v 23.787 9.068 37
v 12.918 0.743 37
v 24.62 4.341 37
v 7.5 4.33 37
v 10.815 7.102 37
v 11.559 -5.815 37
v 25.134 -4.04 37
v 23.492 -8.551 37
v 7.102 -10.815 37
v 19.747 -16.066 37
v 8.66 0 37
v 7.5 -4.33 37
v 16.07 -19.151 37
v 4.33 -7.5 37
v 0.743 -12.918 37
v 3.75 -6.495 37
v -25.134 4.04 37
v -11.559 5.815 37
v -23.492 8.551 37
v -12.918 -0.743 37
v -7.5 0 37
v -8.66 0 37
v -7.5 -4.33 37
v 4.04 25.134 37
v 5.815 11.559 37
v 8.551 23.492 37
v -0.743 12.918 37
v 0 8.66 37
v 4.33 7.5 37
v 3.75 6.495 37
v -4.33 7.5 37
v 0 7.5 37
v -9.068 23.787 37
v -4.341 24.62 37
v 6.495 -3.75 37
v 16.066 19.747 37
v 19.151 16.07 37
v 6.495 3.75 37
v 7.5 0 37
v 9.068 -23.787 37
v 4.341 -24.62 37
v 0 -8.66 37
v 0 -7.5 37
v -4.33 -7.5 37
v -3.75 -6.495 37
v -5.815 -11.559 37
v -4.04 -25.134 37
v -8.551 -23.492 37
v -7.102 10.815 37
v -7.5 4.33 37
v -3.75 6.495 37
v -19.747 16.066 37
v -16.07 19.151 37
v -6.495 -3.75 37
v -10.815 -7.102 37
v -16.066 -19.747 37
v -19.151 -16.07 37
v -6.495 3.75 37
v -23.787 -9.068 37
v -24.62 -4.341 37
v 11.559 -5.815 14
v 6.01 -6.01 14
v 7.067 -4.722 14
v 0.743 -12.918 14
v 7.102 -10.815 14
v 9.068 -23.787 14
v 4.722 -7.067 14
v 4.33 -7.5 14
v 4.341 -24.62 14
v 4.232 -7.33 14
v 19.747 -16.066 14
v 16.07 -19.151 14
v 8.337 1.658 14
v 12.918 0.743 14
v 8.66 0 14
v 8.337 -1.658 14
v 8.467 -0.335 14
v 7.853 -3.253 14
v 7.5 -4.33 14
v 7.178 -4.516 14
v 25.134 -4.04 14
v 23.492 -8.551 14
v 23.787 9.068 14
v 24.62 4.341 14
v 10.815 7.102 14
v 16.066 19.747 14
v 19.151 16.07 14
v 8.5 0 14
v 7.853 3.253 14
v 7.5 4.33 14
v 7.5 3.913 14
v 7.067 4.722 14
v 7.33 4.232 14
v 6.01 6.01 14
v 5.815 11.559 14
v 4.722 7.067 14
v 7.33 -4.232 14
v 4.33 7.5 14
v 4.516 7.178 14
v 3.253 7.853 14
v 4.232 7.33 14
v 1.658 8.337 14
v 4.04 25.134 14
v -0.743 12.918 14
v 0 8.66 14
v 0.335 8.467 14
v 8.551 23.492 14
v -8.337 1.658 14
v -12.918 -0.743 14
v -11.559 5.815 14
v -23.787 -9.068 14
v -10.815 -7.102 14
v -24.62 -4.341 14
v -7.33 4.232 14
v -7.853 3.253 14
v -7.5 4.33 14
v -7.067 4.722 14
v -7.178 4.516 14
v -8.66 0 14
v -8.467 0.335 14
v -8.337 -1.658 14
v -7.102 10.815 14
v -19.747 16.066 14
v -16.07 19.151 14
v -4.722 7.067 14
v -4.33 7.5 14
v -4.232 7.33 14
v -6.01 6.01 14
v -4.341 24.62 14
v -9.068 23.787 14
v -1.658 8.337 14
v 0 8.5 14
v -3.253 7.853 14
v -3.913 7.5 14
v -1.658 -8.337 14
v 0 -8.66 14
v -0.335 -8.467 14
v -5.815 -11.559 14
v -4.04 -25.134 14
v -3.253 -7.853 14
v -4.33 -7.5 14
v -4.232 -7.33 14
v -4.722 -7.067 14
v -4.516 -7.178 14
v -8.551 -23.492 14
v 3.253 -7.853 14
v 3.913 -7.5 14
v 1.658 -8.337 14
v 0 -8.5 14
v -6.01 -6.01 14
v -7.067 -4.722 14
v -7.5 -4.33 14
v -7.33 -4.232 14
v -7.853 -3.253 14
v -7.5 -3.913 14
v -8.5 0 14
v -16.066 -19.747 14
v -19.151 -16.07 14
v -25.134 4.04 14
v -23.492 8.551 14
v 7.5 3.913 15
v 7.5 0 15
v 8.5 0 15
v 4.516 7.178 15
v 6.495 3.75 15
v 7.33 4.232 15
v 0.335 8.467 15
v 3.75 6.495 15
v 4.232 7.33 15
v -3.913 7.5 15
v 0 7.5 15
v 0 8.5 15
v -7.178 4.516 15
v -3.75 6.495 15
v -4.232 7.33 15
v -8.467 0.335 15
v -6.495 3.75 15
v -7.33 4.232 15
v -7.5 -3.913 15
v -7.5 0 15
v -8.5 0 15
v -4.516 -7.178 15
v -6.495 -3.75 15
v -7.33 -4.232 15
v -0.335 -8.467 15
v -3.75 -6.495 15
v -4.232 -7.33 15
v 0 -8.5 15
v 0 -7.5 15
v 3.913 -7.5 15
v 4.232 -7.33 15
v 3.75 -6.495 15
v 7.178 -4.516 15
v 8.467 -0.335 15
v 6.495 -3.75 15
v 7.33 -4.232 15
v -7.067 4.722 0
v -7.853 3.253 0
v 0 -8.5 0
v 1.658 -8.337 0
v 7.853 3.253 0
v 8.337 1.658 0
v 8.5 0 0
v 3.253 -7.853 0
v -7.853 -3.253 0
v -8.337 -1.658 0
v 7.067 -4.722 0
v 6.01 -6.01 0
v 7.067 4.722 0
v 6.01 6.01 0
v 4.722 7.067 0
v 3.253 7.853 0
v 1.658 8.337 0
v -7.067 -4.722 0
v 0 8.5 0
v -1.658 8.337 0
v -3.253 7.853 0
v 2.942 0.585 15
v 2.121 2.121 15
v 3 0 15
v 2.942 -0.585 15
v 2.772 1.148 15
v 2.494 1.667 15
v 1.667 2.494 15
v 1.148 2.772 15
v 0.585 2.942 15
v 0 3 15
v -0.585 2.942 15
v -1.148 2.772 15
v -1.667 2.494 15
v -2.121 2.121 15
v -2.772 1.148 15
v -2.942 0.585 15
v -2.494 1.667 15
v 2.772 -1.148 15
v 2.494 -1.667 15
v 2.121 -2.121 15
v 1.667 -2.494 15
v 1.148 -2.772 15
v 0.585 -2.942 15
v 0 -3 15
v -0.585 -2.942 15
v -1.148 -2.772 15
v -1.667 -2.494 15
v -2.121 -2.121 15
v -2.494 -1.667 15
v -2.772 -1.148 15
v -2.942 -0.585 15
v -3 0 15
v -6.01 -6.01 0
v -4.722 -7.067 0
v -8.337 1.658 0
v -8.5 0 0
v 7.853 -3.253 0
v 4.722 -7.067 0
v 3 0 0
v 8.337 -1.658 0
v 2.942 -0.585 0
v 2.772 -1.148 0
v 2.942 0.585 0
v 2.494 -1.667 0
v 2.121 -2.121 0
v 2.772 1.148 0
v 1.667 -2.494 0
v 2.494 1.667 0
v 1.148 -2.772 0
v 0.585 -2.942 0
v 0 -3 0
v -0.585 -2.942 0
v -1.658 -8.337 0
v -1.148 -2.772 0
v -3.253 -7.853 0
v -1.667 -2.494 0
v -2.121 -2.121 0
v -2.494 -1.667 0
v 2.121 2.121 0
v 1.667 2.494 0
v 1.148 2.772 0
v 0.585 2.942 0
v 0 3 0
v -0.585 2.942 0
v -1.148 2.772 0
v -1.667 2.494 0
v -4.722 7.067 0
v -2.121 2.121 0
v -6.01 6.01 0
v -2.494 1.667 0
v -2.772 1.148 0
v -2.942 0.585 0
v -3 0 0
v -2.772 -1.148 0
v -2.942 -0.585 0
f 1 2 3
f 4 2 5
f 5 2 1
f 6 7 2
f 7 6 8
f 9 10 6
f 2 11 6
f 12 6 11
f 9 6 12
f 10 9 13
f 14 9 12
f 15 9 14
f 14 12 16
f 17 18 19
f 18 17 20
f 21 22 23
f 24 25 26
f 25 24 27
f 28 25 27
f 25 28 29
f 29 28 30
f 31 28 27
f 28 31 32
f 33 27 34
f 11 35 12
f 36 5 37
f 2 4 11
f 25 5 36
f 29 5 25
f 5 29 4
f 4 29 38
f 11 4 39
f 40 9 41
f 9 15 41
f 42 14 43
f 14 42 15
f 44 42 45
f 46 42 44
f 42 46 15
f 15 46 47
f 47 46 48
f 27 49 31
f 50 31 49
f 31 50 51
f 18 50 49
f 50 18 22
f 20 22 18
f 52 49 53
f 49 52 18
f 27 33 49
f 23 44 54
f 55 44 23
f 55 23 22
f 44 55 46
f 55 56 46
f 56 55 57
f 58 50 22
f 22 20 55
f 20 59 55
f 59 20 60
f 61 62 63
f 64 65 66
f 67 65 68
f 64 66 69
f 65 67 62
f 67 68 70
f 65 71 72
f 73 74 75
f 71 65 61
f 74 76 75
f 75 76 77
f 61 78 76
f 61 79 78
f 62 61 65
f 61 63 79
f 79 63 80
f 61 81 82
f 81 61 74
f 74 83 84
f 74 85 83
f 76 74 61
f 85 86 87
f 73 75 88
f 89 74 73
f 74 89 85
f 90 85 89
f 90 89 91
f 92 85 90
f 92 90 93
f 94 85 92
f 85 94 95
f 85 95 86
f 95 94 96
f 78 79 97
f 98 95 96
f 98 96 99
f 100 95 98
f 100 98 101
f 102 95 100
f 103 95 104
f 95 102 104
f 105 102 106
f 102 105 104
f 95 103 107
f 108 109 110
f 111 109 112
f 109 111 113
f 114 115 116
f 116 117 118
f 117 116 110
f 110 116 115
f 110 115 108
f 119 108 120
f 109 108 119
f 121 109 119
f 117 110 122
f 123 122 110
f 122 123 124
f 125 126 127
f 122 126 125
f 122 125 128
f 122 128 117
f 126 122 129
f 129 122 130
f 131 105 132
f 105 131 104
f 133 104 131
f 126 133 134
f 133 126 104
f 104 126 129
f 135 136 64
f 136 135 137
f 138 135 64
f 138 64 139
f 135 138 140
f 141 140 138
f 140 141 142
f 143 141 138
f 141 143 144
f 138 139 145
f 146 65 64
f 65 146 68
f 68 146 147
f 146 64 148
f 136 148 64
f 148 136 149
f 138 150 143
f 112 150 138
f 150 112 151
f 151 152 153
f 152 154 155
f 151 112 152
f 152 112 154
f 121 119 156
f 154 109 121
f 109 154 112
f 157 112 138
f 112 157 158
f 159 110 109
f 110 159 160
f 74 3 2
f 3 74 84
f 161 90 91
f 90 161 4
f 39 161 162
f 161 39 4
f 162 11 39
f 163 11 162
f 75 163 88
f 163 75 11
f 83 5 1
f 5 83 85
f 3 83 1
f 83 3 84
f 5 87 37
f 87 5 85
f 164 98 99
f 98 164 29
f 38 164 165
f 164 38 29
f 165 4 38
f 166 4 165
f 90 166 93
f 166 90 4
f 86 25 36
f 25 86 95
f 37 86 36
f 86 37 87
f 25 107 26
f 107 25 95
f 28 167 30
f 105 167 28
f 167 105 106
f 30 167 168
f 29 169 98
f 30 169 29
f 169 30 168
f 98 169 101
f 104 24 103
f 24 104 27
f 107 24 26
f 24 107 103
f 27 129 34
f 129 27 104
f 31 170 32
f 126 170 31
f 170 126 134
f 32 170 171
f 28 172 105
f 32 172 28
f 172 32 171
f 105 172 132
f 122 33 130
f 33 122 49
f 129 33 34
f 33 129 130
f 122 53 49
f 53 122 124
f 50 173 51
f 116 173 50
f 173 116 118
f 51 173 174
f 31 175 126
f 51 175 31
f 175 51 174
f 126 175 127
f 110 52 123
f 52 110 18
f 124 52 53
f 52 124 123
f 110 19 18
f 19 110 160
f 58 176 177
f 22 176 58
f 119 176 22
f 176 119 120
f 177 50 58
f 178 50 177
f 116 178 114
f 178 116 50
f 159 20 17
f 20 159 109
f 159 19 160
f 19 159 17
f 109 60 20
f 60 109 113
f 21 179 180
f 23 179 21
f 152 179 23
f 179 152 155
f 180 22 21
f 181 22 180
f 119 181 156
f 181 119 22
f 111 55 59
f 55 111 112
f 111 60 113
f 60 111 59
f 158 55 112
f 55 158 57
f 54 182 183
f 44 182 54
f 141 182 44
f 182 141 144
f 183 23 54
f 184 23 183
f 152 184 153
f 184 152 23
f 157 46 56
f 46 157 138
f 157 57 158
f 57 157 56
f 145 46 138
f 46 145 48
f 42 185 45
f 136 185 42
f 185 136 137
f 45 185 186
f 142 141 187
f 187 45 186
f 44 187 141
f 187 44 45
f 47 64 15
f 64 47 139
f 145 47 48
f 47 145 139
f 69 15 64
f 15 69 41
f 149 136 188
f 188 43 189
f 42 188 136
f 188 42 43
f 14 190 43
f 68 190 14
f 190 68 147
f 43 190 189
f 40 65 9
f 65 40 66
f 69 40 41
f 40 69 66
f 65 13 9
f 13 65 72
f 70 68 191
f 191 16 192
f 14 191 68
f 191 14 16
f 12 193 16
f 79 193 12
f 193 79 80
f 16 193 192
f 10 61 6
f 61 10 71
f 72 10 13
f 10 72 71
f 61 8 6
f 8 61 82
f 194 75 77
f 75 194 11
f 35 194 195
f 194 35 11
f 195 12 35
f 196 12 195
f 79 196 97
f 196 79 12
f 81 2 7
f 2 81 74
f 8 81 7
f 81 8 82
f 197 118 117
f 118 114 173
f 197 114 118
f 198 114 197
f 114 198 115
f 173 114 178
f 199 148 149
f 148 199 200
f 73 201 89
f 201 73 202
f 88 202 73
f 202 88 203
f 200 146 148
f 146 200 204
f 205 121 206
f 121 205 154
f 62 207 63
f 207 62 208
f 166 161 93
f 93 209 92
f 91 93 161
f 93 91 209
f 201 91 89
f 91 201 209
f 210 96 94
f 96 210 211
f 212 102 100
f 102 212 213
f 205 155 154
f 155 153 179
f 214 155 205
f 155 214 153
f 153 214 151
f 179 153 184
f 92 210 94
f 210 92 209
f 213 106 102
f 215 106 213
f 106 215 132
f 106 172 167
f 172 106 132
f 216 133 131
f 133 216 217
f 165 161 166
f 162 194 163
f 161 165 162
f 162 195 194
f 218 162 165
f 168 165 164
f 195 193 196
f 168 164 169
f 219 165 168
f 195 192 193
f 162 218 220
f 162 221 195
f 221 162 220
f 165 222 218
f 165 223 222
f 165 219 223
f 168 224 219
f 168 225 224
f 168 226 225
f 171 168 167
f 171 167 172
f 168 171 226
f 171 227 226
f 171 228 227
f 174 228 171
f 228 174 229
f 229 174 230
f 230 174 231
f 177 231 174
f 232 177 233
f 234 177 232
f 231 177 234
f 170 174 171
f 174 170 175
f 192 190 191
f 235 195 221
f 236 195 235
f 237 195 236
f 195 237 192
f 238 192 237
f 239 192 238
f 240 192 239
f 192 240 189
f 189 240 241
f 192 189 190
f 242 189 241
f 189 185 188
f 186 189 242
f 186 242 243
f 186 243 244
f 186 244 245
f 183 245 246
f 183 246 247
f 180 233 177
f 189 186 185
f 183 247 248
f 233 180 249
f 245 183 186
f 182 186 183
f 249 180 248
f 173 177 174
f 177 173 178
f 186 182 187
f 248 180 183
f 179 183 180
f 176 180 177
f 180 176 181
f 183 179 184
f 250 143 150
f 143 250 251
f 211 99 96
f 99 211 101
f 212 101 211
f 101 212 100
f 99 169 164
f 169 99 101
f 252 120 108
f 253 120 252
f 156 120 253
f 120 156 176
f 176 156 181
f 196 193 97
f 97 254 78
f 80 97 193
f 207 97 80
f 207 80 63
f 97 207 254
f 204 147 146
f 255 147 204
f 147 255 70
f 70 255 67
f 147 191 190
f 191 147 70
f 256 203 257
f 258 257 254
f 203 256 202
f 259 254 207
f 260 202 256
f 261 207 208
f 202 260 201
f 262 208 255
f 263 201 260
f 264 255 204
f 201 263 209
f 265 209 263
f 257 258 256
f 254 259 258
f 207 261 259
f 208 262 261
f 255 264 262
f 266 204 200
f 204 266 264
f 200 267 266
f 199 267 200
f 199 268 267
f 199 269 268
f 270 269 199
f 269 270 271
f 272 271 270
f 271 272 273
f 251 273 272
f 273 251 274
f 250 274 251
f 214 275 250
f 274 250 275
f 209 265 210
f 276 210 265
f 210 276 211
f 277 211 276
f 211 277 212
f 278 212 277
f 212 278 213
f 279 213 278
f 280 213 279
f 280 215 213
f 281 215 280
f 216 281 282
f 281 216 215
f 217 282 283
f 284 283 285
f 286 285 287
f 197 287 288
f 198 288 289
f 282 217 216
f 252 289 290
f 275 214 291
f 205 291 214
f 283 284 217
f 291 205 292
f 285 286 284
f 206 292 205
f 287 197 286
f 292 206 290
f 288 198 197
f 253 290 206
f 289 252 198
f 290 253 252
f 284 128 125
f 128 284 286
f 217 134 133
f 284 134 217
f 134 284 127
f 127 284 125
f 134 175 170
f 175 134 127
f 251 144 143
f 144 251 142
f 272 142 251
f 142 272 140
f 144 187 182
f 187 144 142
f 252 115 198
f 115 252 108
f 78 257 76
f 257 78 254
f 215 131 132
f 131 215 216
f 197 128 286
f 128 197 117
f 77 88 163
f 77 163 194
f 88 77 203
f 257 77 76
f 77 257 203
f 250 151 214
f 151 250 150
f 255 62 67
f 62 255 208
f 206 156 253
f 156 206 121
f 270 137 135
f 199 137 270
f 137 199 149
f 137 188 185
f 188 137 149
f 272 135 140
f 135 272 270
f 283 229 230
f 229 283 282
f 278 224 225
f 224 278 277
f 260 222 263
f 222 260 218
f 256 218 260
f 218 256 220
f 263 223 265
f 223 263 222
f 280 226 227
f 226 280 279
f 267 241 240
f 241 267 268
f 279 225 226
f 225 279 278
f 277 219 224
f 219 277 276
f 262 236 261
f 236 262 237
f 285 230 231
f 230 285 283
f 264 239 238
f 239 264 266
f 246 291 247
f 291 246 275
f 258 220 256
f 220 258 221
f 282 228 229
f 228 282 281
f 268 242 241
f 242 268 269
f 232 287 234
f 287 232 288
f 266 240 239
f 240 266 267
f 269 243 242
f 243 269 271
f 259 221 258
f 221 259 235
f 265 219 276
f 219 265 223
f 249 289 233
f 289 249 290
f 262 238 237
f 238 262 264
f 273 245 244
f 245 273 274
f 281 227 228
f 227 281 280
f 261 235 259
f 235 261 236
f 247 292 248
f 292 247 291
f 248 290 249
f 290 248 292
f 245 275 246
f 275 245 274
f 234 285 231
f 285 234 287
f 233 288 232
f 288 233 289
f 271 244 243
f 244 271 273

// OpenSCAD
$fn = 32;

// ----------------------------------------------------------------------
// Impeller: 50 mm, 12 blades, 37 mm tall
// ----------------------------------------------------------------------

// --- parameters (mm) ---
boss_d = 17;              // hub diameter
boss_h = 15;              // hub height
rotor_d = 50;             // outer diameter over the blades
vane_count = 12;          // number of blades
blade_t = 3;              // blade thickness
blade_h = 22;             // blade height
blade_in_r = 7.5;         // blade root radius
blade_out_r = 22;         // blade tip radius
sweep = 10;               // blade sweep, degrees
bore_d = 6;               // shaft bore

module hub() {
  cylinder(h = boss_h, d = boss_d);
}

module blade() {
  /* blade swept between two boxes: hull of the root and the tip section */
  hull() {
    translate([blade_in_r, 0, boss_h - 1])
      cube([blade_t, blade_t * 2.2, blade_h + 1], center = false);
    rotate([0, 0, sweep])
      translate([blade_out_r, 0, boss_h - 1])
        cube([blade_t, blade_t * 1.6, blade_h + 1], center = false);
  }
}

module blades() {
  for (i = [0 : vane_count - 1])
    rotate([0, 0, i * 360 / vane_count]) blade();
}

difference() {
  union() {
    hub();
    blades();
  }
  translate([0, 0, -1]) cylinder(h = boss_h + blade_h + 0 + 3, d = bore_d);
}
